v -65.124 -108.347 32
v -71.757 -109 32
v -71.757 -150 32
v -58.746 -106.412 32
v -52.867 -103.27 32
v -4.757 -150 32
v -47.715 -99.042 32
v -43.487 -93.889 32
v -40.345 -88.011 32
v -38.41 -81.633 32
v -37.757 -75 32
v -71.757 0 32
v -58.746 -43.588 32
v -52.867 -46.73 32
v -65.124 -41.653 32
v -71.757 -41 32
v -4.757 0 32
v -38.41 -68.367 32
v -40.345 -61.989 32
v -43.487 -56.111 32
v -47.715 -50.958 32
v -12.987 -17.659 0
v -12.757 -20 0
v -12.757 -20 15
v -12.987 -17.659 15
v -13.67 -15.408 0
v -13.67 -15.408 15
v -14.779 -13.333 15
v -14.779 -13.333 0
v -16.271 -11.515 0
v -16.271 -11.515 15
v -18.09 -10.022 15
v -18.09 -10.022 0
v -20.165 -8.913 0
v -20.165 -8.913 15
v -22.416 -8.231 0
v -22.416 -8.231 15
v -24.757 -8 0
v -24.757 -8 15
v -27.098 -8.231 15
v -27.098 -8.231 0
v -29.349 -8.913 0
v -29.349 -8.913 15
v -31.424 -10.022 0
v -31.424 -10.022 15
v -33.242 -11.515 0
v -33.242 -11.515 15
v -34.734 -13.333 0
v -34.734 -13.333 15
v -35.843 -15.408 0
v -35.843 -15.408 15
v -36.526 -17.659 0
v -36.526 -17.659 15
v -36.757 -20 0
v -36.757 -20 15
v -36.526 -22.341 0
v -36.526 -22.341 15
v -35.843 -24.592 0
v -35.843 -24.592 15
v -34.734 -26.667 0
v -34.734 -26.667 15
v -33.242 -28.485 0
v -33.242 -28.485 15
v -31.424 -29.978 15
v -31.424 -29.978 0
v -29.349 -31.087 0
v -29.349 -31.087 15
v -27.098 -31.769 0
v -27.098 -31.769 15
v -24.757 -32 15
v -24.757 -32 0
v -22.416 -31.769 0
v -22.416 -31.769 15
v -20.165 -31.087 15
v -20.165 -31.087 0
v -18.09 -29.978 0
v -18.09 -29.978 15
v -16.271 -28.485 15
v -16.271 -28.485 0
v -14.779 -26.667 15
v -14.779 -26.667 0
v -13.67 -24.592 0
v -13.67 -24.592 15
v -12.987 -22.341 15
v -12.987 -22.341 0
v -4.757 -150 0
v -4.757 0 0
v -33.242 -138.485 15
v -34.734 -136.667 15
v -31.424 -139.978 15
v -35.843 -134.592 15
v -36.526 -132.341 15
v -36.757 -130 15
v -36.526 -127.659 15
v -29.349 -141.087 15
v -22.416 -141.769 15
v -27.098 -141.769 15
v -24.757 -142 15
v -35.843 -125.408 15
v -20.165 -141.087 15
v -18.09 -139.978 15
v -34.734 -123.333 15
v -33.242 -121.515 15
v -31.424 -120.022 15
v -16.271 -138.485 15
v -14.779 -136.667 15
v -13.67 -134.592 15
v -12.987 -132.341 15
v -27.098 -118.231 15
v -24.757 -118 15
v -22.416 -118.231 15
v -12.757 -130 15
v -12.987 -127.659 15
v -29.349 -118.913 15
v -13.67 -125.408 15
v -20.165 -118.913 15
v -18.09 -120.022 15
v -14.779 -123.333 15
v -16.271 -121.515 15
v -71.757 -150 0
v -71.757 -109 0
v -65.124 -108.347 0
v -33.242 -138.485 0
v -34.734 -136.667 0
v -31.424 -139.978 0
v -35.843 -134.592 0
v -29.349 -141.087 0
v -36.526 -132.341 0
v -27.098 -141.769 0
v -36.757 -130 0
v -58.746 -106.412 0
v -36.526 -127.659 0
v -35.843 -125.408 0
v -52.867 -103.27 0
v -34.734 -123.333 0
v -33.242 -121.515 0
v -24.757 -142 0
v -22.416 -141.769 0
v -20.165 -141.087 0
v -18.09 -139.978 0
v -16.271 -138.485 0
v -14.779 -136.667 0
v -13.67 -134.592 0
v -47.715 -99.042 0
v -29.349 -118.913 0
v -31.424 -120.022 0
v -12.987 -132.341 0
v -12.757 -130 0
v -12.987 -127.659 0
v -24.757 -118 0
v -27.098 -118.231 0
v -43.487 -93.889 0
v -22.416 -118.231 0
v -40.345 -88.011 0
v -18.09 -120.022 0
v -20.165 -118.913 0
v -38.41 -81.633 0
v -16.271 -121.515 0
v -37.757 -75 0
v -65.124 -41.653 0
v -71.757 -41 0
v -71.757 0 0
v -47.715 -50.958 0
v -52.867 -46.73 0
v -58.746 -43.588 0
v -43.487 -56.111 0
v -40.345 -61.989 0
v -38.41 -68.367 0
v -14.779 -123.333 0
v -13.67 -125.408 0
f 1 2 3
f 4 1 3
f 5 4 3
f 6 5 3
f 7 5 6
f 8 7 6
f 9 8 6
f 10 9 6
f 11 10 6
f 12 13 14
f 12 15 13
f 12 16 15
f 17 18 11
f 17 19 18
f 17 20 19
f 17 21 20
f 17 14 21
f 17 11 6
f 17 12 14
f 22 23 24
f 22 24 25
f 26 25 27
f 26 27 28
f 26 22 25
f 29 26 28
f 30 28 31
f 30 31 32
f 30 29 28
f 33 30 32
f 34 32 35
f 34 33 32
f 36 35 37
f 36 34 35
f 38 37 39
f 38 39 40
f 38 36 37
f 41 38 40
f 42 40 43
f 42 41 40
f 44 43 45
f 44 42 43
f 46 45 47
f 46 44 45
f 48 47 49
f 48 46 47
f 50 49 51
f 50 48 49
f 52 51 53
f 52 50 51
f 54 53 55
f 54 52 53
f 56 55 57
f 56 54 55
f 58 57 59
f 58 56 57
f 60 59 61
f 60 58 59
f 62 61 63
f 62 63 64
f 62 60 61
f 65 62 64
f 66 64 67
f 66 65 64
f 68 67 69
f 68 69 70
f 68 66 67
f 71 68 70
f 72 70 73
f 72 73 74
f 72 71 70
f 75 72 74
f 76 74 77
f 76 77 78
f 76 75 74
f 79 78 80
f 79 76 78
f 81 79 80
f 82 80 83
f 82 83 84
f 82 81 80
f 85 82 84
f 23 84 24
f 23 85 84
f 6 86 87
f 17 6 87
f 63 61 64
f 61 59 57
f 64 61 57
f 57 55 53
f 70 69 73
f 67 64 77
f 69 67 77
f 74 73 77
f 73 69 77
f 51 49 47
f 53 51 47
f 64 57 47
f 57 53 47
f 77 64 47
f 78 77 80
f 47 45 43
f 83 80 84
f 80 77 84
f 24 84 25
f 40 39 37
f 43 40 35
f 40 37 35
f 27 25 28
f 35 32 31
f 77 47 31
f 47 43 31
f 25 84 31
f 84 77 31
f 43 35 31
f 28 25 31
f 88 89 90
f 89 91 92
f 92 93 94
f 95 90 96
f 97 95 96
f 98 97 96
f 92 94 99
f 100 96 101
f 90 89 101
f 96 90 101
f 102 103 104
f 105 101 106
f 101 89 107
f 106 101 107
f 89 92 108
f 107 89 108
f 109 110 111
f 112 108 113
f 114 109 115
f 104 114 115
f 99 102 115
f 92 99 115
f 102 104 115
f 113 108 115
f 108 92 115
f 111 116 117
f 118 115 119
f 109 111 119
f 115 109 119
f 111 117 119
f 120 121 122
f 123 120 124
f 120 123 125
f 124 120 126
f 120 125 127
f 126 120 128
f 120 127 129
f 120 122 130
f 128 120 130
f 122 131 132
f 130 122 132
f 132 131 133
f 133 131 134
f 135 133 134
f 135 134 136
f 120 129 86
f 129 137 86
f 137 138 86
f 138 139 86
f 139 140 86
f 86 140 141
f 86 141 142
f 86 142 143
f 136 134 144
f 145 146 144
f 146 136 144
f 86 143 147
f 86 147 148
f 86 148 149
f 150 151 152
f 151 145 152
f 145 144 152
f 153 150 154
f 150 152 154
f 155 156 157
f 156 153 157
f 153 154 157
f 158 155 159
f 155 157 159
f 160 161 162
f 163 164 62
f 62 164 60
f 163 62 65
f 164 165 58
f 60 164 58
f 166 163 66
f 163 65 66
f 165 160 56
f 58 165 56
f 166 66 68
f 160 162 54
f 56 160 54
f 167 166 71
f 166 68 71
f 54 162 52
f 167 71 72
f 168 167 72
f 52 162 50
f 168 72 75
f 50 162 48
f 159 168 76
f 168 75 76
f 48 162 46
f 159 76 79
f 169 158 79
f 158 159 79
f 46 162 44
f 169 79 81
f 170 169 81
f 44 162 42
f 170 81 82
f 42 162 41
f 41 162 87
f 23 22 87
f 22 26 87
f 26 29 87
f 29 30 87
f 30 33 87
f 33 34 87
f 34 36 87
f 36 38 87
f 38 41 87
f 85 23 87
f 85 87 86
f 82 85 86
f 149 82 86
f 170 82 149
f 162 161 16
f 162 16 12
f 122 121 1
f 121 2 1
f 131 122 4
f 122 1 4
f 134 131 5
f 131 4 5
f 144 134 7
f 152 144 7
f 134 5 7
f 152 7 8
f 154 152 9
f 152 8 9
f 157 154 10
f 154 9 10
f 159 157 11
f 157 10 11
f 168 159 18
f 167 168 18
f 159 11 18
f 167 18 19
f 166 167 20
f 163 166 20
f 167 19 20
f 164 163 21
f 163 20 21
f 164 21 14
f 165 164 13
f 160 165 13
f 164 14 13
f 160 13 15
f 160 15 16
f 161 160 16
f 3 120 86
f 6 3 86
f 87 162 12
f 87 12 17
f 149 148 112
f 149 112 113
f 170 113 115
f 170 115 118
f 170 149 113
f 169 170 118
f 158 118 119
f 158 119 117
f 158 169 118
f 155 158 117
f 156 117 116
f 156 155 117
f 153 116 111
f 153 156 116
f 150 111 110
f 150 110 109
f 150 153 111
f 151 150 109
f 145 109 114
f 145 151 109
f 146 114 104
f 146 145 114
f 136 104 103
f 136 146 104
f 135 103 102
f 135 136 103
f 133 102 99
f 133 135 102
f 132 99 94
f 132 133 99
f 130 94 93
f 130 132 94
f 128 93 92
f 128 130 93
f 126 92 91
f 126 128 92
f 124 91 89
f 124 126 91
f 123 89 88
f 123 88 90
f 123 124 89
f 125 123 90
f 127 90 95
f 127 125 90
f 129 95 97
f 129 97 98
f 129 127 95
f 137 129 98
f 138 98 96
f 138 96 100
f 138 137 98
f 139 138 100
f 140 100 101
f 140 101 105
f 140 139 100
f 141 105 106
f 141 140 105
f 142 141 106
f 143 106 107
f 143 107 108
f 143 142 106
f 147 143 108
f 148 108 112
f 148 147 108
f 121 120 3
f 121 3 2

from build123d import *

# Parameters (mm, degrees)
F0_W     = 67
F0_H     = 150
F2_DEPTH = 32
F3_R     = 34
F4_DEPTH = 32
F1_R     = 12
F5_DEPTH = 15


with BuildPart() as f2:
    # F0 (on Top) → F2 (new body)
    with BuildSketch(Plane.XY):
        with Locations((-38.256745, -75)):
            Rectangle(F0_W, F0_H)
    extrude(amount=F2_DEPTH)

    # F3 (on face) → F4 (cut)
    with BuildSketch(Plane.XY.offset(32)):
        with Locations((-71.756745, -75)):
            Circle(F3_R)
    extrude(amount=-F4_DEPTH, mode=Mode.SUBTRACT)

    # F1 (on face) → F5 (cut)
    with BuildSketch(Plane.XY):
        with Locations((-24.756745, -20)):
            Circle(F1_R)
        with Locations((-24.756745, -130)):
            Circle(F1_R)
    extrude(amount=F5_DEPTH, mode=Mode.SUBTRACT)


solid = f2.part
